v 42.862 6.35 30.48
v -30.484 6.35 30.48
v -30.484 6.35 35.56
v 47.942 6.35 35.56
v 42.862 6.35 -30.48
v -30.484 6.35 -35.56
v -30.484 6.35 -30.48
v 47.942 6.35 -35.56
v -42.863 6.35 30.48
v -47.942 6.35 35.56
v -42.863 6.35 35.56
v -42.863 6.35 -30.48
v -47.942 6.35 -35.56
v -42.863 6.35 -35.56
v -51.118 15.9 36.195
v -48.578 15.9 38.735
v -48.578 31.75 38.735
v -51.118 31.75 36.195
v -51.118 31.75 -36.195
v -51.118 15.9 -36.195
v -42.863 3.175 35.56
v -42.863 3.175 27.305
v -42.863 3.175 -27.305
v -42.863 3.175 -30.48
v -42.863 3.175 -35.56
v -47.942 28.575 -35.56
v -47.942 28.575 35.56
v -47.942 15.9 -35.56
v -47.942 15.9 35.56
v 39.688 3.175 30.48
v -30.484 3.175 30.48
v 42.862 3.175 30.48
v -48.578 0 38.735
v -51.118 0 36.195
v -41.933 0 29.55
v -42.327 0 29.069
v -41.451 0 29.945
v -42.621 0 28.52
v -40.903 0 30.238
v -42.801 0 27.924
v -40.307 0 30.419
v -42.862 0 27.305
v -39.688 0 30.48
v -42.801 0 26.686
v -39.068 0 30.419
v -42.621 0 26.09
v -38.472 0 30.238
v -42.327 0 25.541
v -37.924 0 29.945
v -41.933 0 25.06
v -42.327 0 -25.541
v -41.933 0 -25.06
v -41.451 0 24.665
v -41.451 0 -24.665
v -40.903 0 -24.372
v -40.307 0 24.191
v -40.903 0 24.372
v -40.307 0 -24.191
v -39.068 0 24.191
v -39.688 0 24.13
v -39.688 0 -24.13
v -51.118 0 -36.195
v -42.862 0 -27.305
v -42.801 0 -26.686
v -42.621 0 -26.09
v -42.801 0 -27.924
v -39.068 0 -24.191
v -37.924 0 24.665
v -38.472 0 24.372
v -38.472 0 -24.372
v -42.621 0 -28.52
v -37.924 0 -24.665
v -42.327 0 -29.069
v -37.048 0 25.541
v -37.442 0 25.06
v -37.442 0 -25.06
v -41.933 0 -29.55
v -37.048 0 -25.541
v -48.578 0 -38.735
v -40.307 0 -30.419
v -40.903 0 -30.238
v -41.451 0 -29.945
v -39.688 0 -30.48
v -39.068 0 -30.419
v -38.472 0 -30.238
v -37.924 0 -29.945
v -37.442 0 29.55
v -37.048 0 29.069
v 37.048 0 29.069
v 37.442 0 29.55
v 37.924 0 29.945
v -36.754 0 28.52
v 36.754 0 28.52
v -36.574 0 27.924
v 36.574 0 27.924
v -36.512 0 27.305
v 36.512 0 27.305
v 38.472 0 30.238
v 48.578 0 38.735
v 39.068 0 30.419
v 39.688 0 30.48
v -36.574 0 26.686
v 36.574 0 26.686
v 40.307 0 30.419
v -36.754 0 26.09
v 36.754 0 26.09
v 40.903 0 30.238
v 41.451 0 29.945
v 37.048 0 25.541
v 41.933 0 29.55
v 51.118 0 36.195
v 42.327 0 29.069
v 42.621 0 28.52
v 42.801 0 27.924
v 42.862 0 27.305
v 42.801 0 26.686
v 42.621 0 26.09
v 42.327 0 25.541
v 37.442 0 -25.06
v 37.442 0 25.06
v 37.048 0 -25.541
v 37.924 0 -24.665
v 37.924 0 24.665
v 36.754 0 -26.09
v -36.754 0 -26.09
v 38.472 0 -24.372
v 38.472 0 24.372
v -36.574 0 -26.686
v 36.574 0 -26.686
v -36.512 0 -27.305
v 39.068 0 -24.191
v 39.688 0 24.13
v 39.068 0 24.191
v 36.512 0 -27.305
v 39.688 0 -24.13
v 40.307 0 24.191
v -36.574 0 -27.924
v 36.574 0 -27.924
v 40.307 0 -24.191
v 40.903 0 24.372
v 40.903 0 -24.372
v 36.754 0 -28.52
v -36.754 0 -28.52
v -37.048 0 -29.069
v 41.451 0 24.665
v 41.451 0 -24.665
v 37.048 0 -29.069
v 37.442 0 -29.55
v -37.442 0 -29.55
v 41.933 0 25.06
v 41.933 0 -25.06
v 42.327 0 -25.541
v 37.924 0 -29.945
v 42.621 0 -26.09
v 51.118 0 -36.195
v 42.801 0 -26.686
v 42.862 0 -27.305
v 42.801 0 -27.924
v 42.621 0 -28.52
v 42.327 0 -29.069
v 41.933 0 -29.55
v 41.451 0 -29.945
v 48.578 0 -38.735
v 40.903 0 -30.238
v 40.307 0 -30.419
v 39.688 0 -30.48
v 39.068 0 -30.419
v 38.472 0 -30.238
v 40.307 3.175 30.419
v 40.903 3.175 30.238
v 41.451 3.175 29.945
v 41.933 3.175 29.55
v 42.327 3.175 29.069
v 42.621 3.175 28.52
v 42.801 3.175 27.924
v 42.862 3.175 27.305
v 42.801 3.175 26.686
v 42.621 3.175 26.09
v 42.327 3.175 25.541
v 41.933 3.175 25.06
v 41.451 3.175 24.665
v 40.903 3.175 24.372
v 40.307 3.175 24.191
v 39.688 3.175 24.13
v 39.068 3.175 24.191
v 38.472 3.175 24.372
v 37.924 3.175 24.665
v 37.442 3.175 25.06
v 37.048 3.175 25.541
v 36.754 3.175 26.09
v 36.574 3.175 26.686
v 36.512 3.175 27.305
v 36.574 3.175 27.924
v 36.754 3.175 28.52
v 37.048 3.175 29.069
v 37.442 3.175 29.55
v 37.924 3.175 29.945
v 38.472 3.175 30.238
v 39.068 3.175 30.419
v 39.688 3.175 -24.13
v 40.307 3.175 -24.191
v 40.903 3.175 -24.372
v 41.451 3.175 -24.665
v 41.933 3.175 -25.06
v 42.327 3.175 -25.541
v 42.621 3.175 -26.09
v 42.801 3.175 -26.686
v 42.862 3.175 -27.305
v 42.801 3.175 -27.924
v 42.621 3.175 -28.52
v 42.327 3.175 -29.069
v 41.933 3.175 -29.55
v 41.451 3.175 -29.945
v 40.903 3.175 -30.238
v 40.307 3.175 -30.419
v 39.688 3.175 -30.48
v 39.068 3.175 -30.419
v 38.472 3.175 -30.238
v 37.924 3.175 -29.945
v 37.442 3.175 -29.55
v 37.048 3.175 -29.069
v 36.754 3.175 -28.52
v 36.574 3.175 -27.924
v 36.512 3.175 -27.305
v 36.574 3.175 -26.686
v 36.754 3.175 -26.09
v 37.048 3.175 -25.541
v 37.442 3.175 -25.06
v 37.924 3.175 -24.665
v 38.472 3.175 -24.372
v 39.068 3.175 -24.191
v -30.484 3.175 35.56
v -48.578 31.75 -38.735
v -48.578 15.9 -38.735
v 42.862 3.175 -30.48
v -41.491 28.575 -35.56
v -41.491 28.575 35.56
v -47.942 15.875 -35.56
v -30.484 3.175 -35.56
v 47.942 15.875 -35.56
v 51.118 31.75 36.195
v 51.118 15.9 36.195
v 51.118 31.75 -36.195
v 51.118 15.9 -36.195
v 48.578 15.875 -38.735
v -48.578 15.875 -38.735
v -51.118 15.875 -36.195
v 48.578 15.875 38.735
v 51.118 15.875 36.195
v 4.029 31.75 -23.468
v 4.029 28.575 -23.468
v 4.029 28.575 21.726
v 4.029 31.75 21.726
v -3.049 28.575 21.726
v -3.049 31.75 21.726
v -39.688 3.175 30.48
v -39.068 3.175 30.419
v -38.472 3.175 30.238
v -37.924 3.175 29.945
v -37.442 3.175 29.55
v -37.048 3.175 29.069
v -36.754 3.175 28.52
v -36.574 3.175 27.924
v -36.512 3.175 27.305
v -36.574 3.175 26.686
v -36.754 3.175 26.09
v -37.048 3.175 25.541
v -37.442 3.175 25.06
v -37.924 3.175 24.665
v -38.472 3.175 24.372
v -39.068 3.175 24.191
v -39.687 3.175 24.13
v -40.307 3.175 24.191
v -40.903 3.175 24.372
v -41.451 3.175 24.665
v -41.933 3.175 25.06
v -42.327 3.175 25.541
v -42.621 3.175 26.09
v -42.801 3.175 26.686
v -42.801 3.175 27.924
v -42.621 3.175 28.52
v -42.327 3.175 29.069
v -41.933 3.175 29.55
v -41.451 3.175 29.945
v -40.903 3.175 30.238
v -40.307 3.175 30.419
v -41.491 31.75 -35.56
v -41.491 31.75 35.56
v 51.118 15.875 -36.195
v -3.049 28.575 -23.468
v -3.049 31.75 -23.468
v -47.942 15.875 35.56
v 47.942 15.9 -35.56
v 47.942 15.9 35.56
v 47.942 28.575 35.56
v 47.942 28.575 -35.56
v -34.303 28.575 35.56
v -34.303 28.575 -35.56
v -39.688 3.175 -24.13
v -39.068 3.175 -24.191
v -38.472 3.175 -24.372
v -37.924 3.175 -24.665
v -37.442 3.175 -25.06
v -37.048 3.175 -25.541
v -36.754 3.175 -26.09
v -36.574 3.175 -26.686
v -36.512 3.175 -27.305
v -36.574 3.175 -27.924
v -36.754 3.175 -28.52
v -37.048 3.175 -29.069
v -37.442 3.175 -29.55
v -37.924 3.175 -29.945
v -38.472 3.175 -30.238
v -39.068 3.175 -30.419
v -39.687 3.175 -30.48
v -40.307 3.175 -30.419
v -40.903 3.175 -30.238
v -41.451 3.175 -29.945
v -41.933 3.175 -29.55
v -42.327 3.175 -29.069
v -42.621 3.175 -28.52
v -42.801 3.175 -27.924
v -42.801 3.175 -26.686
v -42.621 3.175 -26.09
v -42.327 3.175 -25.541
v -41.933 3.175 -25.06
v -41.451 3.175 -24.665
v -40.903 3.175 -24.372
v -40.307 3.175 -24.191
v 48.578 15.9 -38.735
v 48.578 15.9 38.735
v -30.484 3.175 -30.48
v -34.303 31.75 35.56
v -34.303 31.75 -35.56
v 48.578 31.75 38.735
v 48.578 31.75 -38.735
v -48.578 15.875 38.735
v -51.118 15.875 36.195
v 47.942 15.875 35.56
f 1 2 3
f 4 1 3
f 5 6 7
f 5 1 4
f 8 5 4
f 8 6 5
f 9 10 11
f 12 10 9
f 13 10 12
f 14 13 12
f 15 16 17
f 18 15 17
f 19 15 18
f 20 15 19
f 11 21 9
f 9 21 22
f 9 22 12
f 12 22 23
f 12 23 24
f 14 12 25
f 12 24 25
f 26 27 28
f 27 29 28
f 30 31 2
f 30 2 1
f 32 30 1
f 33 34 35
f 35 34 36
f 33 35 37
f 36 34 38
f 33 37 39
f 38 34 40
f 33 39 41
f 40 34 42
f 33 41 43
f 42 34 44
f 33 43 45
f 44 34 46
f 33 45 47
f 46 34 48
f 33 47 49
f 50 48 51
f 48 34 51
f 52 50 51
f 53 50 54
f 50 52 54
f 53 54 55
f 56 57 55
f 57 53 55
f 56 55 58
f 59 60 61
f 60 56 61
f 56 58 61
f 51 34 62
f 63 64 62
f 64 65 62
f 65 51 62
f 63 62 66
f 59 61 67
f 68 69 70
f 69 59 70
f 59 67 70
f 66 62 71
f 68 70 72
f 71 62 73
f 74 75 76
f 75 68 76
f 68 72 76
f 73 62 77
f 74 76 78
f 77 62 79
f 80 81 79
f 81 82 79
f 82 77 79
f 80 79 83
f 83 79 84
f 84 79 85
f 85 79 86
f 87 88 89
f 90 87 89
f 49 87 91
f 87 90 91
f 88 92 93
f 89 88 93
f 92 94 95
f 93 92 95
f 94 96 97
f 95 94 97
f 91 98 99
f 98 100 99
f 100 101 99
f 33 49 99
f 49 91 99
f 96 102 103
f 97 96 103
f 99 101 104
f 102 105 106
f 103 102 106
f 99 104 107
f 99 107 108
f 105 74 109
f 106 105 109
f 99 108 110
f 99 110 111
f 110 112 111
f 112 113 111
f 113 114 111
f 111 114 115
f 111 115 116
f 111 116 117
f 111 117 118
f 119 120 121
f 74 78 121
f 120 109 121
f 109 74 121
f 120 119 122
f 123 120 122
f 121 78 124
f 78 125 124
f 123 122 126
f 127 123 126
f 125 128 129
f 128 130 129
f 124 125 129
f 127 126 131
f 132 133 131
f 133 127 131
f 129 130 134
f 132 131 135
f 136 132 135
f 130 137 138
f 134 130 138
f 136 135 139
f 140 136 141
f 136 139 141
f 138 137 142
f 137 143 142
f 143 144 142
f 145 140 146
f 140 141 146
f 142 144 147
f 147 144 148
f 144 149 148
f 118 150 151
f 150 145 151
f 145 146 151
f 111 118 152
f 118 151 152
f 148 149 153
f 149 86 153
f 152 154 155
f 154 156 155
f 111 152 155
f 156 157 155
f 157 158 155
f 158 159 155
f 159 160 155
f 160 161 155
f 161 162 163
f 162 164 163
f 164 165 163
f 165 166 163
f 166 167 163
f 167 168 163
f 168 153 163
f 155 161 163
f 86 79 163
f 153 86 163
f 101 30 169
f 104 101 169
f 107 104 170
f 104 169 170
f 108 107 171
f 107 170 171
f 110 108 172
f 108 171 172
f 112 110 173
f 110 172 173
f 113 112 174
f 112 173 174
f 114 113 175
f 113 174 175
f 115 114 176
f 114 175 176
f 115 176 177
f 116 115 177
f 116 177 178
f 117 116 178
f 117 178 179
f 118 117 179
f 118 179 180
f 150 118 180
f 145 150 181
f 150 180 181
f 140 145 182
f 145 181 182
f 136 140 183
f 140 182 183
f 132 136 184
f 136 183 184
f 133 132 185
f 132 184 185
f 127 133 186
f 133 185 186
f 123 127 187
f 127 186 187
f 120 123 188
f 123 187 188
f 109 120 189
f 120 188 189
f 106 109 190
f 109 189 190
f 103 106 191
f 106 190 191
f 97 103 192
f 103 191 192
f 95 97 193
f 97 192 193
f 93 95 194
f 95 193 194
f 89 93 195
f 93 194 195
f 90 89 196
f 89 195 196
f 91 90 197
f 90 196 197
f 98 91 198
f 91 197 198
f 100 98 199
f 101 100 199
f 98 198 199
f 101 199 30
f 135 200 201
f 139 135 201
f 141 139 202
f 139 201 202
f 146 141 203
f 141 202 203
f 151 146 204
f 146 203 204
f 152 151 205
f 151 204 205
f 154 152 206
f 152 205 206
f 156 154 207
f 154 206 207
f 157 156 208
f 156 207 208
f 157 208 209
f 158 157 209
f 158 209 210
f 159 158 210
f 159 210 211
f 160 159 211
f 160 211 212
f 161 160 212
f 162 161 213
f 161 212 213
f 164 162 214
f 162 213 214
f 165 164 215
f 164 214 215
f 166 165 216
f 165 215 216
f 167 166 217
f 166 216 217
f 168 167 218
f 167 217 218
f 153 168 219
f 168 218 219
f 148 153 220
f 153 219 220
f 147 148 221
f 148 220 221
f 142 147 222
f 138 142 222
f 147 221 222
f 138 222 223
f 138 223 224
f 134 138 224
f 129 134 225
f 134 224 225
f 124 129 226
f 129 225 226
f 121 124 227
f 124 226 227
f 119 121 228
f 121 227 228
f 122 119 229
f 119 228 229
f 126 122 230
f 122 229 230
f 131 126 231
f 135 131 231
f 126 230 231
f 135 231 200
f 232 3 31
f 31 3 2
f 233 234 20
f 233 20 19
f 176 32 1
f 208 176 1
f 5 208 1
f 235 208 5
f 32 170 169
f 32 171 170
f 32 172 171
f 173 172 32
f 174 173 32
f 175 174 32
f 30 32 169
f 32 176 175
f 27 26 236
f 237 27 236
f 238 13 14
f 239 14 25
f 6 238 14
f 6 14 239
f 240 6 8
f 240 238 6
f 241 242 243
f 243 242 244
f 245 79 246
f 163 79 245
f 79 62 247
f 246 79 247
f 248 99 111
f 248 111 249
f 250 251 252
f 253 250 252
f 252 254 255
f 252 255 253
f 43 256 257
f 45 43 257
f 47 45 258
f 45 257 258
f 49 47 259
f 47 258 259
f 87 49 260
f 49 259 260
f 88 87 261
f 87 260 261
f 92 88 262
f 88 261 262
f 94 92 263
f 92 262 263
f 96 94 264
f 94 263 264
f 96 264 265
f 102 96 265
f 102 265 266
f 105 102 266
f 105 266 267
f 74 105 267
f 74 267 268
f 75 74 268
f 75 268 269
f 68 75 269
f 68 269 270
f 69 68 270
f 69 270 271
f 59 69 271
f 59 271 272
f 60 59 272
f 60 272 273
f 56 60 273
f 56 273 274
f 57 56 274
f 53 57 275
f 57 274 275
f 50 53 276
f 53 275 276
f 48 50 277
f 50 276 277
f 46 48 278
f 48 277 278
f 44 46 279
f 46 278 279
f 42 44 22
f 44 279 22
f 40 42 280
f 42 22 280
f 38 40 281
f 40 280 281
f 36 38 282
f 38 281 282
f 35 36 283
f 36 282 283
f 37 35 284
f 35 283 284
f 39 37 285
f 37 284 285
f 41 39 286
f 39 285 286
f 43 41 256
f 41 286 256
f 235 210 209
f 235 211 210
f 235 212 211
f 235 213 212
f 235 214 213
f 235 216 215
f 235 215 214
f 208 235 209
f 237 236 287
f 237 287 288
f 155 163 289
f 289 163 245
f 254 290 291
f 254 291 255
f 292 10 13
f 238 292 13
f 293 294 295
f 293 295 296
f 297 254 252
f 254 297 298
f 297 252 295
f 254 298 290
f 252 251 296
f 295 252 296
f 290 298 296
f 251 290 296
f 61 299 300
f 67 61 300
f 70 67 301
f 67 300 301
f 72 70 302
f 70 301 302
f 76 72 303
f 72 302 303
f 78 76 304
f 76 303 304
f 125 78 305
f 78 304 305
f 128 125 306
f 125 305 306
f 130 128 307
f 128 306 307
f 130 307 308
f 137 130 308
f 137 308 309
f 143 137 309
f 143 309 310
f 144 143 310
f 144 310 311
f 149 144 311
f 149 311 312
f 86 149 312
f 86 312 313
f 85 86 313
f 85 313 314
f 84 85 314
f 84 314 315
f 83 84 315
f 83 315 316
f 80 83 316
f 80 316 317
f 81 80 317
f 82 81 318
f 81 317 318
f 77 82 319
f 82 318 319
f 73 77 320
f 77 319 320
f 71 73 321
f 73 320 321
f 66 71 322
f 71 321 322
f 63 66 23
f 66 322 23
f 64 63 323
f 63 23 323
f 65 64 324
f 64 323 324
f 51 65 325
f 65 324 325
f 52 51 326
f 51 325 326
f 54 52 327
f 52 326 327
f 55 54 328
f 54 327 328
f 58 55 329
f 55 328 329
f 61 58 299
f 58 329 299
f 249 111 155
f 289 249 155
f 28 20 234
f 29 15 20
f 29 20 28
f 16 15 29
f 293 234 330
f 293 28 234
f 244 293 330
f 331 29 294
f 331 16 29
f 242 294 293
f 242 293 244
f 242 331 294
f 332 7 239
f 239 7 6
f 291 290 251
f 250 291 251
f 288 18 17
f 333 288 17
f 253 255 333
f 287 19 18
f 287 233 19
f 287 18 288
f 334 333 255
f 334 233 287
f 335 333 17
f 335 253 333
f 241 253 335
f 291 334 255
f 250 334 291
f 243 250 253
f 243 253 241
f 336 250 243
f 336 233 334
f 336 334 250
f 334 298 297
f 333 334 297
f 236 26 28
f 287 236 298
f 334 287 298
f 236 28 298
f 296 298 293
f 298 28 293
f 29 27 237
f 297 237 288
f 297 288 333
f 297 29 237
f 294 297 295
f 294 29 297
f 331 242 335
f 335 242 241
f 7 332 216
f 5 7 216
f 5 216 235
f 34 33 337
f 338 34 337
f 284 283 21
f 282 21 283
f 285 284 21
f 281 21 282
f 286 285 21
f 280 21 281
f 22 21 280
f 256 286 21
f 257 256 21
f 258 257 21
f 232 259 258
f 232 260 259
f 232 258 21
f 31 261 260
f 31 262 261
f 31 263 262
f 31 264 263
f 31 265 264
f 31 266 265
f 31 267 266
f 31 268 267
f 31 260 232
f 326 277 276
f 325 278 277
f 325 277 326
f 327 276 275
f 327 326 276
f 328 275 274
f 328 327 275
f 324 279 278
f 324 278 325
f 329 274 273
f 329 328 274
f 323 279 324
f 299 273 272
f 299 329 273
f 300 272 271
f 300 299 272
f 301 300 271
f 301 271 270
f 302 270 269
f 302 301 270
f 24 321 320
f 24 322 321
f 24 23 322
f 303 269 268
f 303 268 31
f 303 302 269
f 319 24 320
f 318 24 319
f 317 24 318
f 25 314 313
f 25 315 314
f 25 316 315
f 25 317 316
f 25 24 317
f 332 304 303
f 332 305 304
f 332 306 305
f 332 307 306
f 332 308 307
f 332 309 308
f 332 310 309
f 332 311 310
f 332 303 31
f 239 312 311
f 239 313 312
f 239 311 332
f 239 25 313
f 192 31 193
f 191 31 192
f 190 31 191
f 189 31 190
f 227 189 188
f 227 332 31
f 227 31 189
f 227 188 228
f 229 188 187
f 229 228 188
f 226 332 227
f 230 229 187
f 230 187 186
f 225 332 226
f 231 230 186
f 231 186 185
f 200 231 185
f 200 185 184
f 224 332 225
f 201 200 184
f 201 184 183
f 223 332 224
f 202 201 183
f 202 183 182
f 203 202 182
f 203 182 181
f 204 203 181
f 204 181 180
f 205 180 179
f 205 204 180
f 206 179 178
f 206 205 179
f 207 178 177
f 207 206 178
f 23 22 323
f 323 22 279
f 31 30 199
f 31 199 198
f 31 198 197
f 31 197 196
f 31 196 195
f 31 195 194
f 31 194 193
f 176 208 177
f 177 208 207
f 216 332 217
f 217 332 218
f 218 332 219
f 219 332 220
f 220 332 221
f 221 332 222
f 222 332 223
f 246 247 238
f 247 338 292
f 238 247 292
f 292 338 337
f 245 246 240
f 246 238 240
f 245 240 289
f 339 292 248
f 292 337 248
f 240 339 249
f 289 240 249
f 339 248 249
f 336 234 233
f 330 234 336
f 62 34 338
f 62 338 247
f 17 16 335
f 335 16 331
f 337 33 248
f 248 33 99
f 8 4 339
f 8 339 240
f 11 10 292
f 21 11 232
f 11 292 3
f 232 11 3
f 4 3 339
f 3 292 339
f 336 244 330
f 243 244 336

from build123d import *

# Parameters (mm, degrees)
SKETCH1_W           = 102.235
SKETCH1_H           = 77.47
BOSS_EXTRUDE1_DEPTH = 31.75
SKETCH5_W           = 138.084997612
SKETCH5_H           = 0.0254
CUT_EXTRUDE4_DEPTH  = 99.095169128
SHELL1_T            = -3.175
SHELL2_T            = -3.175
SKETCH6_W           = 95.885
SKETCH6_H           = 71.12
SKETCH6_W_2         = 85.725
SKETCH6_H_2         = 60.96
BOSS_EXTRUDE2_DEPTH = 3.175
SKETCH7_W           = 12.378962441
SKETCH7_H           = 5.08
CUT_EXTRUDE5_DEPTH  = 3.175
SKETCH8_W           = 7.187389466
SKETCH8_H           = 71.12
SKETCH8_W_2         = 7.078489625
SKETCH8_H_2         = 45.193433761
CUT_EXTRUDE6_DEPTH  = 71.2134578
CHAMFER1_SIZE       = 2.54
CHAMFER2_SIZE       = 2.54
SKETCH9_R           = 3.175
CUT_EXTRUDE7_DEPTH  = 71.2134578


with BuildPart() as part:
    # Sketch1 → Boss-Extrude1 (new body)
    with BuildSketch(Plane(origin=(0, 0, 0), x_dir=(1, 0, 0), z_dir=(0, 1, 0))):
        Rectangle(SKETCH1_W, SKETCH1_H)
    extrude(amount=BOSS_EXTRUDE1_DEPTH)

    # Sketch5 → Cut-Extrude4 (cut, through all)
    with BuildSketch(Plane.XY.offset(38.735)):
        with Locations((-1.742397446, 15.8877)):
            Rectangle(SKETCH5_W, SKETCH5_H)
    extrude(amount=-CUT_EXTRUDE4_DEPTH, mode=Mode.SUBTRACT)


with BuildPart() as cut_extrude4_piece_1:
    # of the separate pieces the step leaves, piece 1, a body of its own (cut_extrude4_pieces)
    add(part.part.solids().sort_by_distance((-51.1175, 0, 38.735))[0])

    # Shell1
    shell1_openings = [cut_extrude4_piece_1.faces().sort_by_distance(p)[0] for p in [
        (0, 15.875, 0),
    ]]
    offset(amount=SHELL1_T, openings=shell1_openings, kind=Kind.INTERSECTION)

    # Sketch6 → Boss-Extrude2 (add)
    with BuildSketch(Plane(origin=(0, 3.175, 0), x_dir=(1, 0, 0), z_dir=(0, 1, 0))):
        Rectangle(SKETCH6_W, SKETCH6_H)
        Rectangle(SKETCH6_W_2, SKETCH6_H_2, mode=Mode.SUBTRACT)
    extrude(amount=BOSS_EXTRUDE2_DEPTH)

    # Sketch7 → Cut-Extrude5 (cut)
    with BuildSketch(Plane(origin=(0, 6.35, 0), x_dir=(1, 0, 0), z_dir=(0, 1, 0))):
        with Locations((-36.67301878, 33.02)):
            Rectangle(SKETCH7_W, SKETCH7_H)
        with Locations((-36.67301878, -33.02)):
            Rectangle(SKETCH7_W, SKETCH7_H)
    extrude(amount=-CUT_EXTRUDE5_DEPTH, mode=Mode.SUBTRACT)

    # Chamfer2
    chamfer2_edges = [cut_extrude4_piece_1.edges().sort_by_distance(p)[0] for p in [
        (-51.1175, 7.9375, 38.735),
        (-51.1175, 7.9375, -38.735),
        (51.1175, 7.9375, -38.735),
        (51.1175, 7.9375, 38.735),
    ]]
    chamfer(chamfer2_edges, length=CHAMFER2_SIZE)

    # Sketch9 → Cut-Extrude7 (cut, through all)
    with BuildSketch(Plane(origin=(0, 3.175, 0), x_dir=(1, 0, 0), z_dir=(0, 1, 0))):
        with Locations(Location((-39.6875, 27.305, 0), (0, 0, 270))):
            Circle(SKETCH9_R)
        with Locations(Location((39.6875, 27.305, 0), (0, 0, 270))):
            Circle(SKETCH9_R)
        with Locations(Location((39.6875, -27.305, 0), (0, 0, 270))):
            Circle(SKETCH9_R)
        with Locations(Location((-39.6875, -27.305, 0), (0, 0, 270))):
            Circle(SKETCH9_R)
    extrude(amount=-CUT_EXTRUDE7_DEPTH, mode=Mode.SUBTRACT)


with BuildPart() as cut_extrude4_piece_2:
    # of the separate pieces the step leaves, piece 2, a body of its own (cut_extrude4_pieces)
    add(part.part.solids().sort_by_distance((51.1175, 15.9004, 38.735))[0])

    # Shell2
    shell2_openings = [cut_extrude4_piece_2.faces().sort_by_distance(p)[0] for p in [
        (0, 15.9004, 0),
    ]]
    offset(amount=SHELL2_T, openings=shell2_openings, kind=Kind.INTERSECTION)

    # Sketch8 → Cut-Extrude6 (cut, through all)
    with BuildSketch(Plane.XZ.offset(-28.575)):
        with Locations((-37.897144455, 0)):
            Rectangle(SKETCH8_W, SKETCH8_H)
        with Locations((0.490049281, -0.871198724)):
            Rectangle(SKETCH8_W_2, SKETCH8_H_2)
    extrude(amount=-CUT_EXTRUDE6_DEPTH, mode=Mode.SUBTRACT)

    # Chamfer1
    chamfer1_edges = [cut_extrude4_piece_2.edges().sort_by_distance(p)[0] for p in [
        (-51.1175, 23.8252, 38.735),
        (51.1175, 23.8252, 38.735),
        (51.1175, 23.8252, -38.735),
        (-51.1175, 23.8252, -38.735),
    ]]
    chamfer(chamfer1_edges, length=CHAMFER1_SIZE)


solid = Compound([cut_extrude4_piece_1.part, cut_extrude4_piece_2.part])
